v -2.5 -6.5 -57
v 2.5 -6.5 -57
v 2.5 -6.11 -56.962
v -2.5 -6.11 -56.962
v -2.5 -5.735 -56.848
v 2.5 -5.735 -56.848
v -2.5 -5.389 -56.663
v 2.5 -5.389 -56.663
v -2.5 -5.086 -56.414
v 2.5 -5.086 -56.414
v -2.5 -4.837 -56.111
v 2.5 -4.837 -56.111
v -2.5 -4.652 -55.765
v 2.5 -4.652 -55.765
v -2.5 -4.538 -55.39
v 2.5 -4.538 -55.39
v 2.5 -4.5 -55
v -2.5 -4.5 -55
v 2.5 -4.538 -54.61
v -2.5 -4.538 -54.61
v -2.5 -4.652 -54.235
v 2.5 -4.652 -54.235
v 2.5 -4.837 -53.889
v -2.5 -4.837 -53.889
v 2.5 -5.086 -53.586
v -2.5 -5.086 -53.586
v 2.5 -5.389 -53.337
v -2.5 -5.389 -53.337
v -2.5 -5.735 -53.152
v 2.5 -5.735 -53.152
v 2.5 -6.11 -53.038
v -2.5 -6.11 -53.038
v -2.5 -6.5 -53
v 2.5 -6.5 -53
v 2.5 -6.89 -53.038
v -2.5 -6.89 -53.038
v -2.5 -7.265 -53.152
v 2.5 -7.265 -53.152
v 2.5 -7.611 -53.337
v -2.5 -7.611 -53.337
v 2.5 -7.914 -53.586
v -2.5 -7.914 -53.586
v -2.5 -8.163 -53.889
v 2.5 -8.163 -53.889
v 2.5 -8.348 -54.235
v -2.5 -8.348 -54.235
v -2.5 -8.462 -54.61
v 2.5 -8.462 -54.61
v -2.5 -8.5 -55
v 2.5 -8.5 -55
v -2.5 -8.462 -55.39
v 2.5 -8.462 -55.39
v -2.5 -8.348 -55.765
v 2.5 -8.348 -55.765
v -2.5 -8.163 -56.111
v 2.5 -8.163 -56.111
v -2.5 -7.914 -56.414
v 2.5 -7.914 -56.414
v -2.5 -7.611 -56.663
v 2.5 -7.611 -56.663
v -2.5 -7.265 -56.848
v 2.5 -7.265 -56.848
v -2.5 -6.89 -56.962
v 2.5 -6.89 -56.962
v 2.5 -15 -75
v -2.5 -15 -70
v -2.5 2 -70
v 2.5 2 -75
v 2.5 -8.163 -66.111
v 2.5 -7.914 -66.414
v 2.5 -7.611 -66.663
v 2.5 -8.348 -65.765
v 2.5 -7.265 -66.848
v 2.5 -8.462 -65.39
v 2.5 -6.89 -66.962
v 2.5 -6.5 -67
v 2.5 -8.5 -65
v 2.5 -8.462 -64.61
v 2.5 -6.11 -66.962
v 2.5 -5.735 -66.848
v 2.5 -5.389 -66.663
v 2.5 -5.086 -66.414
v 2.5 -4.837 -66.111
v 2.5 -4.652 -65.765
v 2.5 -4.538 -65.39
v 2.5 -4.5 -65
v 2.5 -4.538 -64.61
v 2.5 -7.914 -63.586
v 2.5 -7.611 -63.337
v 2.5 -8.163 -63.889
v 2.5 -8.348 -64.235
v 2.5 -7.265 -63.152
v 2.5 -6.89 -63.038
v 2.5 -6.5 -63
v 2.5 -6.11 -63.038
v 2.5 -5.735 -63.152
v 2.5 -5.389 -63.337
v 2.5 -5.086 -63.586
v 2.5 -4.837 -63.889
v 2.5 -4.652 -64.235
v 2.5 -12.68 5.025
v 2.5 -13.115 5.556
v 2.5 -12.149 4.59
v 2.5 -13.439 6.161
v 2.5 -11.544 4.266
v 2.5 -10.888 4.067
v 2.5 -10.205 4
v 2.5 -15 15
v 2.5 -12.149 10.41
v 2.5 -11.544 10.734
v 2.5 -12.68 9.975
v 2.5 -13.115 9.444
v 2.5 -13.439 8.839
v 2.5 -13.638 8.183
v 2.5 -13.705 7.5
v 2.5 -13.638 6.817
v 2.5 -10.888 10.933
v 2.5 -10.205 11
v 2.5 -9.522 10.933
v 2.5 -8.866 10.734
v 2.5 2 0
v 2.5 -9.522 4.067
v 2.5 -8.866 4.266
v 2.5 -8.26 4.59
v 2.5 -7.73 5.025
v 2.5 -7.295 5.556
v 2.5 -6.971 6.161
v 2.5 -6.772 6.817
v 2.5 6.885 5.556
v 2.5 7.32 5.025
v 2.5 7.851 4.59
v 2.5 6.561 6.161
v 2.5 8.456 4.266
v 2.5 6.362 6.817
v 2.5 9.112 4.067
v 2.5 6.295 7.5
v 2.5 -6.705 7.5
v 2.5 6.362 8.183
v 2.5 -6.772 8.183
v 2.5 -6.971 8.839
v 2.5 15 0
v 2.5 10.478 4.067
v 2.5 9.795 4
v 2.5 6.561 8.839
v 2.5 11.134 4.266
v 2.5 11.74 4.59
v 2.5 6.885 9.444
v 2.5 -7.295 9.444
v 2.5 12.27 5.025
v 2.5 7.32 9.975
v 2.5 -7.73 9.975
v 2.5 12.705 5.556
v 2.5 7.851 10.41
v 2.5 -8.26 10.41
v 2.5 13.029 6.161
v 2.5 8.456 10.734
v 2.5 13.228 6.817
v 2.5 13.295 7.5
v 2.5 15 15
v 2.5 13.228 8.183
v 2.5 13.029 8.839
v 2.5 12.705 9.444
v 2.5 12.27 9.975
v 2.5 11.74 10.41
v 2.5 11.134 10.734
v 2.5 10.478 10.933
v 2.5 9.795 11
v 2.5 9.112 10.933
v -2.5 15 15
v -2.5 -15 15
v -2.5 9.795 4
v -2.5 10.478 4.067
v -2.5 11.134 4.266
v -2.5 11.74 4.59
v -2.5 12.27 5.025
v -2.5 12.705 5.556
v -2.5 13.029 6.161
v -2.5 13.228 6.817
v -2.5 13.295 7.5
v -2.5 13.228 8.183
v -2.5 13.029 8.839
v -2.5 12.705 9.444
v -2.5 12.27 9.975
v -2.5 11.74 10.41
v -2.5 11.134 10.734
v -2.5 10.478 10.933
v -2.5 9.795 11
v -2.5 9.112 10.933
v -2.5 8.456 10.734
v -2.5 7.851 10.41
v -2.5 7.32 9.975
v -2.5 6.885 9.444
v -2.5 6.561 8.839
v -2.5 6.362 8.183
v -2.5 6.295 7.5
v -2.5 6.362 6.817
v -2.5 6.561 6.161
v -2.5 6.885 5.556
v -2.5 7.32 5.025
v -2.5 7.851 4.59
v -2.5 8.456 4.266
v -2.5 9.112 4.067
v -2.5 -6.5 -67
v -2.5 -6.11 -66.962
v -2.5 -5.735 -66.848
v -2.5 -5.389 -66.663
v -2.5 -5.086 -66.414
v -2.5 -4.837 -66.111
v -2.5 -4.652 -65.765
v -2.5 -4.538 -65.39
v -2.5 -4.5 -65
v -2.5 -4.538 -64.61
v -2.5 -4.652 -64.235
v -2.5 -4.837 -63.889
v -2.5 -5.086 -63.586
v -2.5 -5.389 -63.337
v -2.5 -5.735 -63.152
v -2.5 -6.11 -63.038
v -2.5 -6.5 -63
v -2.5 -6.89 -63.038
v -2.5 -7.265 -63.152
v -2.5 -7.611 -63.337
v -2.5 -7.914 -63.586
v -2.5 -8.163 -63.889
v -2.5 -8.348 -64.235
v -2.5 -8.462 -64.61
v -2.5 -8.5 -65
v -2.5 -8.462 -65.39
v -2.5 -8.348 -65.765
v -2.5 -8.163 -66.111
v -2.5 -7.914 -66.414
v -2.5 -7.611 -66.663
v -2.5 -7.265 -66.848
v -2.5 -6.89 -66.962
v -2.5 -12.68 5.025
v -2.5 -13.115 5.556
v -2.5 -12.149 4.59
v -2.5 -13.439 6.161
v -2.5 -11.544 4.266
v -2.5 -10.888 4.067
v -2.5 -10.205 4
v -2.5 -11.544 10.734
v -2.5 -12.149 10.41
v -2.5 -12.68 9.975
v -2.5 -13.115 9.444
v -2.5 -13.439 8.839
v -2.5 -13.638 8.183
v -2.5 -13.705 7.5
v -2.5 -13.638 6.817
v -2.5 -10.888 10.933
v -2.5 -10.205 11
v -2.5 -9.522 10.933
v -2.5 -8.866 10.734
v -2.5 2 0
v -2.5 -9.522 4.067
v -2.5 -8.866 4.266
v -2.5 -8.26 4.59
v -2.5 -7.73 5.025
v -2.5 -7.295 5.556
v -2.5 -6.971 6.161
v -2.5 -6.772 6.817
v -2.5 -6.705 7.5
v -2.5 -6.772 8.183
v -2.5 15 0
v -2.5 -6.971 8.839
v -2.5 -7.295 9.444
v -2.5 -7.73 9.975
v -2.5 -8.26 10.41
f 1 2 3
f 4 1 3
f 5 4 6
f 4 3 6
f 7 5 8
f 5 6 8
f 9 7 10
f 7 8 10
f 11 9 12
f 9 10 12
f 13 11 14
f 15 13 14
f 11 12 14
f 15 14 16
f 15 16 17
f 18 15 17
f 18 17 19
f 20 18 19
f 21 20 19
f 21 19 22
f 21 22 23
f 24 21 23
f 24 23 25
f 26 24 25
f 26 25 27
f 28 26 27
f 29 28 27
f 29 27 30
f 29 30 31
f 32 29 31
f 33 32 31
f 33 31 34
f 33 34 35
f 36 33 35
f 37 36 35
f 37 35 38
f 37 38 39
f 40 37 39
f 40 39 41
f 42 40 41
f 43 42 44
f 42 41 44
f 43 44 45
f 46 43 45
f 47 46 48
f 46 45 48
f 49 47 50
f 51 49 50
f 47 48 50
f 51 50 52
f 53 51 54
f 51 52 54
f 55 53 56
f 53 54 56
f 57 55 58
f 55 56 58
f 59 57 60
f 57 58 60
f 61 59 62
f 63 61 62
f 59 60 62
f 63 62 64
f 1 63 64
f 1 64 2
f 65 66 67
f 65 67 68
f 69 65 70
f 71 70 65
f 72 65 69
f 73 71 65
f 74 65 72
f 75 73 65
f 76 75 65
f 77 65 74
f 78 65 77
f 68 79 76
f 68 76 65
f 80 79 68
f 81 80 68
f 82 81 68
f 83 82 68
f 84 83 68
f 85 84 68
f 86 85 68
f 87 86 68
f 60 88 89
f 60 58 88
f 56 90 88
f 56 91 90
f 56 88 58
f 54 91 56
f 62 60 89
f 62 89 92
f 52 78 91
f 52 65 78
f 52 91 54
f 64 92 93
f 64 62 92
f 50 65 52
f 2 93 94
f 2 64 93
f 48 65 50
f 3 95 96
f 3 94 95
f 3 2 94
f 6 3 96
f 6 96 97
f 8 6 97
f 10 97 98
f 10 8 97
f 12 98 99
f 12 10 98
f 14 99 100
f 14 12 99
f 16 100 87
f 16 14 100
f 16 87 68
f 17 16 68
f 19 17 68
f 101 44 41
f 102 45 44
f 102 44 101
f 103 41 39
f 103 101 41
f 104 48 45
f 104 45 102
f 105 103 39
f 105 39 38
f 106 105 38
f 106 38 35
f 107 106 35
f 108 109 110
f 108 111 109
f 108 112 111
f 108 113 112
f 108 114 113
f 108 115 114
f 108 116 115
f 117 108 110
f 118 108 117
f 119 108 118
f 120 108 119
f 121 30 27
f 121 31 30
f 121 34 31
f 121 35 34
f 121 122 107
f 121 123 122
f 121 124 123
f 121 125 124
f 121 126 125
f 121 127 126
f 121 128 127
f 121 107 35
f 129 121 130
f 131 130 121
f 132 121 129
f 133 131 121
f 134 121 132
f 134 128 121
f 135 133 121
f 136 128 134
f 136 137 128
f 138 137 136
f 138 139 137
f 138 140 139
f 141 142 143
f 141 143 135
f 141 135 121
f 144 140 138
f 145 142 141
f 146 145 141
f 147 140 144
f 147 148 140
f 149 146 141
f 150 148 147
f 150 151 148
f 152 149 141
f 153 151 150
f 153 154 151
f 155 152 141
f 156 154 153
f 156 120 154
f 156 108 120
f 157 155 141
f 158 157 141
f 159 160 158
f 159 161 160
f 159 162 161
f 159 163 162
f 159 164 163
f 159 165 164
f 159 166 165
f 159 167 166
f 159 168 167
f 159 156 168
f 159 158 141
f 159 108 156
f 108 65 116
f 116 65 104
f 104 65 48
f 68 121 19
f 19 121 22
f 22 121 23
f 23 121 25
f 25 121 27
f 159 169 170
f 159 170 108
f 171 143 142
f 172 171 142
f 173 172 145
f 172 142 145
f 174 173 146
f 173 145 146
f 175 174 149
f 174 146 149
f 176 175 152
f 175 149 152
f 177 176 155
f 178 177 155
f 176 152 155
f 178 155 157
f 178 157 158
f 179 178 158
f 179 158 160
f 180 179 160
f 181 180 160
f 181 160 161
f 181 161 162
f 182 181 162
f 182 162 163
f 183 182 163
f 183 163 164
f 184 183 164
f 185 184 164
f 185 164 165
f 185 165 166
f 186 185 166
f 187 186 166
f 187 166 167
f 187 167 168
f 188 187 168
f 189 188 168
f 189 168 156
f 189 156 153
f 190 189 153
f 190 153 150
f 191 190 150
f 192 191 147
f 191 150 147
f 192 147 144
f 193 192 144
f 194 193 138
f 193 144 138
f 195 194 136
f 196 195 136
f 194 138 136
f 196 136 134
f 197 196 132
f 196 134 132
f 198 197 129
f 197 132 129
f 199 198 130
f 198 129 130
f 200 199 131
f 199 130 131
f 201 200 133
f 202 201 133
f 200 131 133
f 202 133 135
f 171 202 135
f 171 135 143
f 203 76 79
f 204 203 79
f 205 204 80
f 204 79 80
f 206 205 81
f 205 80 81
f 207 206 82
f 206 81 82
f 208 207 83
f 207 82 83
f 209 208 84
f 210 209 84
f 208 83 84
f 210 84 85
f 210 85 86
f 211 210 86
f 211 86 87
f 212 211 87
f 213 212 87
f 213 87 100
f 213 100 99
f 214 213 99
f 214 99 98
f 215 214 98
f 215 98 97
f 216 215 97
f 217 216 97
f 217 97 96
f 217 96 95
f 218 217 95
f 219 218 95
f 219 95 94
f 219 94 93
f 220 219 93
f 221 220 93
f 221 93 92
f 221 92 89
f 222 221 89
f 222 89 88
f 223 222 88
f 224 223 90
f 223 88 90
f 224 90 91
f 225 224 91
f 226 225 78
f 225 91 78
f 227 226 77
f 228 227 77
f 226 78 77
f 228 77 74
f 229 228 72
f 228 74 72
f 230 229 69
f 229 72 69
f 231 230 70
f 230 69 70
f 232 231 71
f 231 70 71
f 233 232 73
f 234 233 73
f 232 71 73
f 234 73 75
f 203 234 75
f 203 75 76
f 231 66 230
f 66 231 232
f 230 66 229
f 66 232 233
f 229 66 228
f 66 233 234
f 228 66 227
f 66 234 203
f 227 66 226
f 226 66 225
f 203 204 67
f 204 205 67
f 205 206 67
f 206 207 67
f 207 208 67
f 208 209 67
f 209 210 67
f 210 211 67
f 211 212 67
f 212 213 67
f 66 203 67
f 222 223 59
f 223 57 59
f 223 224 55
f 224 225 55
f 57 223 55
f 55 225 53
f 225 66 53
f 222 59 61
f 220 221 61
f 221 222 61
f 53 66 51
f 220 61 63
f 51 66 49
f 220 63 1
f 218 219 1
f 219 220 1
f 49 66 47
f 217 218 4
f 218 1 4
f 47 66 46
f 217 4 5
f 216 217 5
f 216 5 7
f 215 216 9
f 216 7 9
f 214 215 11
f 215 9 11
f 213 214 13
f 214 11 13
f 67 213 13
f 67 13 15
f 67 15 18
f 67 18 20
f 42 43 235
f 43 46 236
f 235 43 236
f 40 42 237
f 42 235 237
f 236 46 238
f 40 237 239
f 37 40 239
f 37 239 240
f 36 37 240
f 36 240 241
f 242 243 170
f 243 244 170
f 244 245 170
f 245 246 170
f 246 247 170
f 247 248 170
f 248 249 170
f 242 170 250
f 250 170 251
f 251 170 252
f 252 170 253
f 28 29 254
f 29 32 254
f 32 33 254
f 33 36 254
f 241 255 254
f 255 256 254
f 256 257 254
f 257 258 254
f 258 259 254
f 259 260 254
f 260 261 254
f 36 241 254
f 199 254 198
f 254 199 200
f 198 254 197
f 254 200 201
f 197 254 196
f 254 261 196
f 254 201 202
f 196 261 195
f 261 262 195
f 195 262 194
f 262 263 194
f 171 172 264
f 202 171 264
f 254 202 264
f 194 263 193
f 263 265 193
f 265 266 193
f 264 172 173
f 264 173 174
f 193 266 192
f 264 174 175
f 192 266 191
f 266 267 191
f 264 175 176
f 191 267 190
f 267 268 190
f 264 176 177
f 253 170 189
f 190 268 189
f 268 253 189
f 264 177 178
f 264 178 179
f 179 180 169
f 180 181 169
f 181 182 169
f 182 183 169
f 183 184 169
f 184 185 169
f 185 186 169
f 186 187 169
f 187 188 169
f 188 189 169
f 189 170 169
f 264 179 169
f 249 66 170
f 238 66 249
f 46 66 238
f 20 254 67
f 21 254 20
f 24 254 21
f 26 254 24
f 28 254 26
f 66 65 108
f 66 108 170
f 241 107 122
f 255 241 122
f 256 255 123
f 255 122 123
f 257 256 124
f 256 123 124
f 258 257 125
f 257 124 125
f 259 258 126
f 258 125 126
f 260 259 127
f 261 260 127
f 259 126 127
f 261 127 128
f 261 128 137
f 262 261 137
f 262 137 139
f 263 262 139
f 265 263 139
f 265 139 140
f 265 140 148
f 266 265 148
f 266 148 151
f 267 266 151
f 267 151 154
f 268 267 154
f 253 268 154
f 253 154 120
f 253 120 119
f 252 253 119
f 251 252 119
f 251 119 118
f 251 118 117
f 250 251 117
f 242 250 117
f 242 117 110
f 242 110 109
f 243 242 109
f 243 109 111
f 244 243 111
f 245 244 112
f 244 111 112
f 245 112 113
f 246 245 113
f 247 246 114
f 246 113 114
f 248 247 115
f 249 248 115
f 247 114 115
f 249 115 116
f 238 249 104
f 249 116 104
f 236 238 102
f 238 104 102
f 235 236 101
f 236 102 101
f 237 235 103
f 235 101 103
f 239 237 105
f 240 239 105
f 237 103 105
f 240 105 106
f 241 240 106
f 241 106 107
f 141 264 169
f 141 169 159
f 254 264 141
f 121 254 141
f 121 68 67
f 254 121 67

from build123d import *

# Parameters (mm, degrees)
CROQUIS1_W              = 5
CROQUIS1_H              = 30
SALIENTE_EXTRUIR1_DEPTH = 15
CROQUIS2_R              = 3.5
CORTAR_EXTRUIR1_DEPTH   = 15
CROQUIS3_W              = 5
CROQUIS3_H              = 17
SALIENTE_EXTRUIR2_DEPTH = 80
CROQUIS5_R              = 2
CORTAR_EXTRUIR3_DEPTH   = 75
CORTAR_EXTRUIR4_DEPTH   = 30


with BuildPart() as part:
    # Croquis1 → Saliente-Extruir1 (new body)
    with BuildSketch(Plane.XY):
        Rectangle(CROQUIS1_W, CROQUIS1_H)
    extrude(amount=SALIENTE_EXTRUIR1_DEPTH)

    # Croquis2 → Cortar-Extruir1 (cut)
    with BuildSketch(Plane(origin=(2.5, 0, 0), x_dir=(0, 0, -1), z_dir=(1, 0, 0))):
        with Locations((-7.5, 9.795077014)):
            Circle(CROQUIS2_R)
        with Locations((-7.5, -10.204922986)):
            Circle(CROQUIS2_R)
    extrude(amount=-CORTAR_EXTRUIR1_DEPTH, mode=Mode.SUBTRACT)

    # Croquis3 → Saliente-Extruir2 (add)
    with BuildSketch(Plane(origin=(0, 0, 0), x_dir=(-1, 0, 0), z_dir=(0, 0, -1))):
        with Locations((0, -6.5)):
            Rectangle(CROQUIS3_W, CROQUIS3_H)
    extrude(amount=SALIENTE_EXTRUIR2_DEPTH)

    # Croquis5 → Cortar-Extruir3 (cut)
    with BuildSketch(Plane(origin=(2.5, 0, 0), x_dir=(0, 0, -1), z_dir=(1, 0, 0))):
        with Locations((65, -6.5)):
            Circle(CROQUIS5_R)
        with Locations((55, -6.5)):
            Circle(CROQUIS5_R)
    extrude(amount=-CORTAR_EXTRUIR3_DEPTH, mode=Mode.SUBTRACT)

    # Croquis6 → Cortar-Extruir4 (cut)
    with BuildSketch(Plane(origin=(0, 2, 0), x_dir=(1, 0, 0), z_dir=(0, 1, 0))):
        Polygon((-2.5, 70), (2.5, 75), (2.5, 80), (-2.5, 80), align=None)
    extrude(amount=-CORTAR_EXTRUIR4_DEPTH, mode=Mode.SUBTRACT)


solid = part.part
